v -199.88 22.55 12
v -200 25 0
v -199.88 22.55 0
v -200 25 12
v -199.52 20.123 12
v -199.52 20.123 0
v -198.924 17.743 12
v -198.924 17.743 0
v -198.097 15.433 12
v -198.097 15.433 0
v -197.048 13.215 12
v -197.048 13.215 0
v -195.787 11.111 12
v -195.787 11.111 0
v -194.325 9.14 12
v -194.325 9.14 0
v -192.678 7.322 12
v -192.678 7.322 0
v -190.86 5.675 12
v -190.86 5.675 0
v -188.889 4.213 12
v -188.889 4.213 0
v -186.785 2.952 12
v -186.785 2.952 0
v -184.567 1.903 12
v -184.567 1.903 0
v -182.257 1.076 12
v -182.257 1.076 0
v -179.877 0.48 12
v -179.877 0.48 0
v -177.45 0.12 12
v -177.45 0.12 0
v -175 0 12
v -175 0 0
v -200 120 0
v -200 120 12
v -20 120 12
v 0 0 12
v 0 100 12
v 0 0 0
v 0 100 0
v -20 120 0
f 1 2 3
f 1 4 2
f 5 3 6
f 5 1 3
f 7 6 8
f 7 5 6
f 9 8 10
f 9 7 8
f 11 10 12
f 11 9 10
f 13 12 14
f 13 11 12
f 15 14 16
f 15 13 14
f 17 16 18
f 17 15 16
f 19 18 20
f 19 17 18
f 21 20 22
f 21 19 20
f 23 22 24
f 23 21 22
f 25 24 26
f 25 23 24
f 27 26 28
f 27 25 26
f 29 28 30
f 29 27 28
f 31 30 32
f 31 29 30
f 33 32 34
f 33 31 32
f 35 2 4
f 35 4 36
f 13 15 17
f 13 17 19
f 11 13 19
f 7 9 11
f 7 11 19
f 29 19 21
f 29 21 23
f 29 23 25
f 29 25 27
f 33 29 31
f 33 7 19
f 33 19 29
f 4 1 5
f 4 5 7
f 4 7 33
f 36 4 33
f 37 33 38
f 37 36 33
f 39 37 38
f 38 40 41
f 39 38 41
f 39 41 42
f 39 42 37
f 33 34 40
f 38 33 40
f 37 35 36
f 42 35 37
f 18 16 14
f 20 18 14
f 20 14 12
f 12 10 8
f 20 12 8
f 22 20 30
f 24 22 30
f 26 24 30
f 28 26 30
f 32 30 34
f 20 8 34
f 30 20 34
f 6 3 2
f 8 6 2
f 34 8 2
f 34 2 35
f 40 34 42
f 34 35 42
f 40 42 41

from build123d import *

# Parameters (mm, degrees)
F0_W     = 200
F0_H     = 120
F1_DEPTH = 12
F2_R     = 25
F3_SIZE  = 20


with BuildPart() as f1:
    # F0 (on Top) → F1 (new body)
    with BuildSketch(Plane.XY):
        with Locations((-100, 60)):
            Rectangle(F0_W, F0_H)
    extrude(amount=F1_DEPTH)

    # F2
    f2_edges = [f1.edges().sort_by_distance(p)[0] for p in [
        (-200, 0, 6),
    ]]
    fillet(f2_edges, radius=F2_R)

    # F3
    f3_edges = [f1.edges().sort_by_distance(p)[0] for p in [
        (0, 120, 6),
    ]]
    chamfer(f3_edges, length=F3_SIZE)


solid = f1.part
